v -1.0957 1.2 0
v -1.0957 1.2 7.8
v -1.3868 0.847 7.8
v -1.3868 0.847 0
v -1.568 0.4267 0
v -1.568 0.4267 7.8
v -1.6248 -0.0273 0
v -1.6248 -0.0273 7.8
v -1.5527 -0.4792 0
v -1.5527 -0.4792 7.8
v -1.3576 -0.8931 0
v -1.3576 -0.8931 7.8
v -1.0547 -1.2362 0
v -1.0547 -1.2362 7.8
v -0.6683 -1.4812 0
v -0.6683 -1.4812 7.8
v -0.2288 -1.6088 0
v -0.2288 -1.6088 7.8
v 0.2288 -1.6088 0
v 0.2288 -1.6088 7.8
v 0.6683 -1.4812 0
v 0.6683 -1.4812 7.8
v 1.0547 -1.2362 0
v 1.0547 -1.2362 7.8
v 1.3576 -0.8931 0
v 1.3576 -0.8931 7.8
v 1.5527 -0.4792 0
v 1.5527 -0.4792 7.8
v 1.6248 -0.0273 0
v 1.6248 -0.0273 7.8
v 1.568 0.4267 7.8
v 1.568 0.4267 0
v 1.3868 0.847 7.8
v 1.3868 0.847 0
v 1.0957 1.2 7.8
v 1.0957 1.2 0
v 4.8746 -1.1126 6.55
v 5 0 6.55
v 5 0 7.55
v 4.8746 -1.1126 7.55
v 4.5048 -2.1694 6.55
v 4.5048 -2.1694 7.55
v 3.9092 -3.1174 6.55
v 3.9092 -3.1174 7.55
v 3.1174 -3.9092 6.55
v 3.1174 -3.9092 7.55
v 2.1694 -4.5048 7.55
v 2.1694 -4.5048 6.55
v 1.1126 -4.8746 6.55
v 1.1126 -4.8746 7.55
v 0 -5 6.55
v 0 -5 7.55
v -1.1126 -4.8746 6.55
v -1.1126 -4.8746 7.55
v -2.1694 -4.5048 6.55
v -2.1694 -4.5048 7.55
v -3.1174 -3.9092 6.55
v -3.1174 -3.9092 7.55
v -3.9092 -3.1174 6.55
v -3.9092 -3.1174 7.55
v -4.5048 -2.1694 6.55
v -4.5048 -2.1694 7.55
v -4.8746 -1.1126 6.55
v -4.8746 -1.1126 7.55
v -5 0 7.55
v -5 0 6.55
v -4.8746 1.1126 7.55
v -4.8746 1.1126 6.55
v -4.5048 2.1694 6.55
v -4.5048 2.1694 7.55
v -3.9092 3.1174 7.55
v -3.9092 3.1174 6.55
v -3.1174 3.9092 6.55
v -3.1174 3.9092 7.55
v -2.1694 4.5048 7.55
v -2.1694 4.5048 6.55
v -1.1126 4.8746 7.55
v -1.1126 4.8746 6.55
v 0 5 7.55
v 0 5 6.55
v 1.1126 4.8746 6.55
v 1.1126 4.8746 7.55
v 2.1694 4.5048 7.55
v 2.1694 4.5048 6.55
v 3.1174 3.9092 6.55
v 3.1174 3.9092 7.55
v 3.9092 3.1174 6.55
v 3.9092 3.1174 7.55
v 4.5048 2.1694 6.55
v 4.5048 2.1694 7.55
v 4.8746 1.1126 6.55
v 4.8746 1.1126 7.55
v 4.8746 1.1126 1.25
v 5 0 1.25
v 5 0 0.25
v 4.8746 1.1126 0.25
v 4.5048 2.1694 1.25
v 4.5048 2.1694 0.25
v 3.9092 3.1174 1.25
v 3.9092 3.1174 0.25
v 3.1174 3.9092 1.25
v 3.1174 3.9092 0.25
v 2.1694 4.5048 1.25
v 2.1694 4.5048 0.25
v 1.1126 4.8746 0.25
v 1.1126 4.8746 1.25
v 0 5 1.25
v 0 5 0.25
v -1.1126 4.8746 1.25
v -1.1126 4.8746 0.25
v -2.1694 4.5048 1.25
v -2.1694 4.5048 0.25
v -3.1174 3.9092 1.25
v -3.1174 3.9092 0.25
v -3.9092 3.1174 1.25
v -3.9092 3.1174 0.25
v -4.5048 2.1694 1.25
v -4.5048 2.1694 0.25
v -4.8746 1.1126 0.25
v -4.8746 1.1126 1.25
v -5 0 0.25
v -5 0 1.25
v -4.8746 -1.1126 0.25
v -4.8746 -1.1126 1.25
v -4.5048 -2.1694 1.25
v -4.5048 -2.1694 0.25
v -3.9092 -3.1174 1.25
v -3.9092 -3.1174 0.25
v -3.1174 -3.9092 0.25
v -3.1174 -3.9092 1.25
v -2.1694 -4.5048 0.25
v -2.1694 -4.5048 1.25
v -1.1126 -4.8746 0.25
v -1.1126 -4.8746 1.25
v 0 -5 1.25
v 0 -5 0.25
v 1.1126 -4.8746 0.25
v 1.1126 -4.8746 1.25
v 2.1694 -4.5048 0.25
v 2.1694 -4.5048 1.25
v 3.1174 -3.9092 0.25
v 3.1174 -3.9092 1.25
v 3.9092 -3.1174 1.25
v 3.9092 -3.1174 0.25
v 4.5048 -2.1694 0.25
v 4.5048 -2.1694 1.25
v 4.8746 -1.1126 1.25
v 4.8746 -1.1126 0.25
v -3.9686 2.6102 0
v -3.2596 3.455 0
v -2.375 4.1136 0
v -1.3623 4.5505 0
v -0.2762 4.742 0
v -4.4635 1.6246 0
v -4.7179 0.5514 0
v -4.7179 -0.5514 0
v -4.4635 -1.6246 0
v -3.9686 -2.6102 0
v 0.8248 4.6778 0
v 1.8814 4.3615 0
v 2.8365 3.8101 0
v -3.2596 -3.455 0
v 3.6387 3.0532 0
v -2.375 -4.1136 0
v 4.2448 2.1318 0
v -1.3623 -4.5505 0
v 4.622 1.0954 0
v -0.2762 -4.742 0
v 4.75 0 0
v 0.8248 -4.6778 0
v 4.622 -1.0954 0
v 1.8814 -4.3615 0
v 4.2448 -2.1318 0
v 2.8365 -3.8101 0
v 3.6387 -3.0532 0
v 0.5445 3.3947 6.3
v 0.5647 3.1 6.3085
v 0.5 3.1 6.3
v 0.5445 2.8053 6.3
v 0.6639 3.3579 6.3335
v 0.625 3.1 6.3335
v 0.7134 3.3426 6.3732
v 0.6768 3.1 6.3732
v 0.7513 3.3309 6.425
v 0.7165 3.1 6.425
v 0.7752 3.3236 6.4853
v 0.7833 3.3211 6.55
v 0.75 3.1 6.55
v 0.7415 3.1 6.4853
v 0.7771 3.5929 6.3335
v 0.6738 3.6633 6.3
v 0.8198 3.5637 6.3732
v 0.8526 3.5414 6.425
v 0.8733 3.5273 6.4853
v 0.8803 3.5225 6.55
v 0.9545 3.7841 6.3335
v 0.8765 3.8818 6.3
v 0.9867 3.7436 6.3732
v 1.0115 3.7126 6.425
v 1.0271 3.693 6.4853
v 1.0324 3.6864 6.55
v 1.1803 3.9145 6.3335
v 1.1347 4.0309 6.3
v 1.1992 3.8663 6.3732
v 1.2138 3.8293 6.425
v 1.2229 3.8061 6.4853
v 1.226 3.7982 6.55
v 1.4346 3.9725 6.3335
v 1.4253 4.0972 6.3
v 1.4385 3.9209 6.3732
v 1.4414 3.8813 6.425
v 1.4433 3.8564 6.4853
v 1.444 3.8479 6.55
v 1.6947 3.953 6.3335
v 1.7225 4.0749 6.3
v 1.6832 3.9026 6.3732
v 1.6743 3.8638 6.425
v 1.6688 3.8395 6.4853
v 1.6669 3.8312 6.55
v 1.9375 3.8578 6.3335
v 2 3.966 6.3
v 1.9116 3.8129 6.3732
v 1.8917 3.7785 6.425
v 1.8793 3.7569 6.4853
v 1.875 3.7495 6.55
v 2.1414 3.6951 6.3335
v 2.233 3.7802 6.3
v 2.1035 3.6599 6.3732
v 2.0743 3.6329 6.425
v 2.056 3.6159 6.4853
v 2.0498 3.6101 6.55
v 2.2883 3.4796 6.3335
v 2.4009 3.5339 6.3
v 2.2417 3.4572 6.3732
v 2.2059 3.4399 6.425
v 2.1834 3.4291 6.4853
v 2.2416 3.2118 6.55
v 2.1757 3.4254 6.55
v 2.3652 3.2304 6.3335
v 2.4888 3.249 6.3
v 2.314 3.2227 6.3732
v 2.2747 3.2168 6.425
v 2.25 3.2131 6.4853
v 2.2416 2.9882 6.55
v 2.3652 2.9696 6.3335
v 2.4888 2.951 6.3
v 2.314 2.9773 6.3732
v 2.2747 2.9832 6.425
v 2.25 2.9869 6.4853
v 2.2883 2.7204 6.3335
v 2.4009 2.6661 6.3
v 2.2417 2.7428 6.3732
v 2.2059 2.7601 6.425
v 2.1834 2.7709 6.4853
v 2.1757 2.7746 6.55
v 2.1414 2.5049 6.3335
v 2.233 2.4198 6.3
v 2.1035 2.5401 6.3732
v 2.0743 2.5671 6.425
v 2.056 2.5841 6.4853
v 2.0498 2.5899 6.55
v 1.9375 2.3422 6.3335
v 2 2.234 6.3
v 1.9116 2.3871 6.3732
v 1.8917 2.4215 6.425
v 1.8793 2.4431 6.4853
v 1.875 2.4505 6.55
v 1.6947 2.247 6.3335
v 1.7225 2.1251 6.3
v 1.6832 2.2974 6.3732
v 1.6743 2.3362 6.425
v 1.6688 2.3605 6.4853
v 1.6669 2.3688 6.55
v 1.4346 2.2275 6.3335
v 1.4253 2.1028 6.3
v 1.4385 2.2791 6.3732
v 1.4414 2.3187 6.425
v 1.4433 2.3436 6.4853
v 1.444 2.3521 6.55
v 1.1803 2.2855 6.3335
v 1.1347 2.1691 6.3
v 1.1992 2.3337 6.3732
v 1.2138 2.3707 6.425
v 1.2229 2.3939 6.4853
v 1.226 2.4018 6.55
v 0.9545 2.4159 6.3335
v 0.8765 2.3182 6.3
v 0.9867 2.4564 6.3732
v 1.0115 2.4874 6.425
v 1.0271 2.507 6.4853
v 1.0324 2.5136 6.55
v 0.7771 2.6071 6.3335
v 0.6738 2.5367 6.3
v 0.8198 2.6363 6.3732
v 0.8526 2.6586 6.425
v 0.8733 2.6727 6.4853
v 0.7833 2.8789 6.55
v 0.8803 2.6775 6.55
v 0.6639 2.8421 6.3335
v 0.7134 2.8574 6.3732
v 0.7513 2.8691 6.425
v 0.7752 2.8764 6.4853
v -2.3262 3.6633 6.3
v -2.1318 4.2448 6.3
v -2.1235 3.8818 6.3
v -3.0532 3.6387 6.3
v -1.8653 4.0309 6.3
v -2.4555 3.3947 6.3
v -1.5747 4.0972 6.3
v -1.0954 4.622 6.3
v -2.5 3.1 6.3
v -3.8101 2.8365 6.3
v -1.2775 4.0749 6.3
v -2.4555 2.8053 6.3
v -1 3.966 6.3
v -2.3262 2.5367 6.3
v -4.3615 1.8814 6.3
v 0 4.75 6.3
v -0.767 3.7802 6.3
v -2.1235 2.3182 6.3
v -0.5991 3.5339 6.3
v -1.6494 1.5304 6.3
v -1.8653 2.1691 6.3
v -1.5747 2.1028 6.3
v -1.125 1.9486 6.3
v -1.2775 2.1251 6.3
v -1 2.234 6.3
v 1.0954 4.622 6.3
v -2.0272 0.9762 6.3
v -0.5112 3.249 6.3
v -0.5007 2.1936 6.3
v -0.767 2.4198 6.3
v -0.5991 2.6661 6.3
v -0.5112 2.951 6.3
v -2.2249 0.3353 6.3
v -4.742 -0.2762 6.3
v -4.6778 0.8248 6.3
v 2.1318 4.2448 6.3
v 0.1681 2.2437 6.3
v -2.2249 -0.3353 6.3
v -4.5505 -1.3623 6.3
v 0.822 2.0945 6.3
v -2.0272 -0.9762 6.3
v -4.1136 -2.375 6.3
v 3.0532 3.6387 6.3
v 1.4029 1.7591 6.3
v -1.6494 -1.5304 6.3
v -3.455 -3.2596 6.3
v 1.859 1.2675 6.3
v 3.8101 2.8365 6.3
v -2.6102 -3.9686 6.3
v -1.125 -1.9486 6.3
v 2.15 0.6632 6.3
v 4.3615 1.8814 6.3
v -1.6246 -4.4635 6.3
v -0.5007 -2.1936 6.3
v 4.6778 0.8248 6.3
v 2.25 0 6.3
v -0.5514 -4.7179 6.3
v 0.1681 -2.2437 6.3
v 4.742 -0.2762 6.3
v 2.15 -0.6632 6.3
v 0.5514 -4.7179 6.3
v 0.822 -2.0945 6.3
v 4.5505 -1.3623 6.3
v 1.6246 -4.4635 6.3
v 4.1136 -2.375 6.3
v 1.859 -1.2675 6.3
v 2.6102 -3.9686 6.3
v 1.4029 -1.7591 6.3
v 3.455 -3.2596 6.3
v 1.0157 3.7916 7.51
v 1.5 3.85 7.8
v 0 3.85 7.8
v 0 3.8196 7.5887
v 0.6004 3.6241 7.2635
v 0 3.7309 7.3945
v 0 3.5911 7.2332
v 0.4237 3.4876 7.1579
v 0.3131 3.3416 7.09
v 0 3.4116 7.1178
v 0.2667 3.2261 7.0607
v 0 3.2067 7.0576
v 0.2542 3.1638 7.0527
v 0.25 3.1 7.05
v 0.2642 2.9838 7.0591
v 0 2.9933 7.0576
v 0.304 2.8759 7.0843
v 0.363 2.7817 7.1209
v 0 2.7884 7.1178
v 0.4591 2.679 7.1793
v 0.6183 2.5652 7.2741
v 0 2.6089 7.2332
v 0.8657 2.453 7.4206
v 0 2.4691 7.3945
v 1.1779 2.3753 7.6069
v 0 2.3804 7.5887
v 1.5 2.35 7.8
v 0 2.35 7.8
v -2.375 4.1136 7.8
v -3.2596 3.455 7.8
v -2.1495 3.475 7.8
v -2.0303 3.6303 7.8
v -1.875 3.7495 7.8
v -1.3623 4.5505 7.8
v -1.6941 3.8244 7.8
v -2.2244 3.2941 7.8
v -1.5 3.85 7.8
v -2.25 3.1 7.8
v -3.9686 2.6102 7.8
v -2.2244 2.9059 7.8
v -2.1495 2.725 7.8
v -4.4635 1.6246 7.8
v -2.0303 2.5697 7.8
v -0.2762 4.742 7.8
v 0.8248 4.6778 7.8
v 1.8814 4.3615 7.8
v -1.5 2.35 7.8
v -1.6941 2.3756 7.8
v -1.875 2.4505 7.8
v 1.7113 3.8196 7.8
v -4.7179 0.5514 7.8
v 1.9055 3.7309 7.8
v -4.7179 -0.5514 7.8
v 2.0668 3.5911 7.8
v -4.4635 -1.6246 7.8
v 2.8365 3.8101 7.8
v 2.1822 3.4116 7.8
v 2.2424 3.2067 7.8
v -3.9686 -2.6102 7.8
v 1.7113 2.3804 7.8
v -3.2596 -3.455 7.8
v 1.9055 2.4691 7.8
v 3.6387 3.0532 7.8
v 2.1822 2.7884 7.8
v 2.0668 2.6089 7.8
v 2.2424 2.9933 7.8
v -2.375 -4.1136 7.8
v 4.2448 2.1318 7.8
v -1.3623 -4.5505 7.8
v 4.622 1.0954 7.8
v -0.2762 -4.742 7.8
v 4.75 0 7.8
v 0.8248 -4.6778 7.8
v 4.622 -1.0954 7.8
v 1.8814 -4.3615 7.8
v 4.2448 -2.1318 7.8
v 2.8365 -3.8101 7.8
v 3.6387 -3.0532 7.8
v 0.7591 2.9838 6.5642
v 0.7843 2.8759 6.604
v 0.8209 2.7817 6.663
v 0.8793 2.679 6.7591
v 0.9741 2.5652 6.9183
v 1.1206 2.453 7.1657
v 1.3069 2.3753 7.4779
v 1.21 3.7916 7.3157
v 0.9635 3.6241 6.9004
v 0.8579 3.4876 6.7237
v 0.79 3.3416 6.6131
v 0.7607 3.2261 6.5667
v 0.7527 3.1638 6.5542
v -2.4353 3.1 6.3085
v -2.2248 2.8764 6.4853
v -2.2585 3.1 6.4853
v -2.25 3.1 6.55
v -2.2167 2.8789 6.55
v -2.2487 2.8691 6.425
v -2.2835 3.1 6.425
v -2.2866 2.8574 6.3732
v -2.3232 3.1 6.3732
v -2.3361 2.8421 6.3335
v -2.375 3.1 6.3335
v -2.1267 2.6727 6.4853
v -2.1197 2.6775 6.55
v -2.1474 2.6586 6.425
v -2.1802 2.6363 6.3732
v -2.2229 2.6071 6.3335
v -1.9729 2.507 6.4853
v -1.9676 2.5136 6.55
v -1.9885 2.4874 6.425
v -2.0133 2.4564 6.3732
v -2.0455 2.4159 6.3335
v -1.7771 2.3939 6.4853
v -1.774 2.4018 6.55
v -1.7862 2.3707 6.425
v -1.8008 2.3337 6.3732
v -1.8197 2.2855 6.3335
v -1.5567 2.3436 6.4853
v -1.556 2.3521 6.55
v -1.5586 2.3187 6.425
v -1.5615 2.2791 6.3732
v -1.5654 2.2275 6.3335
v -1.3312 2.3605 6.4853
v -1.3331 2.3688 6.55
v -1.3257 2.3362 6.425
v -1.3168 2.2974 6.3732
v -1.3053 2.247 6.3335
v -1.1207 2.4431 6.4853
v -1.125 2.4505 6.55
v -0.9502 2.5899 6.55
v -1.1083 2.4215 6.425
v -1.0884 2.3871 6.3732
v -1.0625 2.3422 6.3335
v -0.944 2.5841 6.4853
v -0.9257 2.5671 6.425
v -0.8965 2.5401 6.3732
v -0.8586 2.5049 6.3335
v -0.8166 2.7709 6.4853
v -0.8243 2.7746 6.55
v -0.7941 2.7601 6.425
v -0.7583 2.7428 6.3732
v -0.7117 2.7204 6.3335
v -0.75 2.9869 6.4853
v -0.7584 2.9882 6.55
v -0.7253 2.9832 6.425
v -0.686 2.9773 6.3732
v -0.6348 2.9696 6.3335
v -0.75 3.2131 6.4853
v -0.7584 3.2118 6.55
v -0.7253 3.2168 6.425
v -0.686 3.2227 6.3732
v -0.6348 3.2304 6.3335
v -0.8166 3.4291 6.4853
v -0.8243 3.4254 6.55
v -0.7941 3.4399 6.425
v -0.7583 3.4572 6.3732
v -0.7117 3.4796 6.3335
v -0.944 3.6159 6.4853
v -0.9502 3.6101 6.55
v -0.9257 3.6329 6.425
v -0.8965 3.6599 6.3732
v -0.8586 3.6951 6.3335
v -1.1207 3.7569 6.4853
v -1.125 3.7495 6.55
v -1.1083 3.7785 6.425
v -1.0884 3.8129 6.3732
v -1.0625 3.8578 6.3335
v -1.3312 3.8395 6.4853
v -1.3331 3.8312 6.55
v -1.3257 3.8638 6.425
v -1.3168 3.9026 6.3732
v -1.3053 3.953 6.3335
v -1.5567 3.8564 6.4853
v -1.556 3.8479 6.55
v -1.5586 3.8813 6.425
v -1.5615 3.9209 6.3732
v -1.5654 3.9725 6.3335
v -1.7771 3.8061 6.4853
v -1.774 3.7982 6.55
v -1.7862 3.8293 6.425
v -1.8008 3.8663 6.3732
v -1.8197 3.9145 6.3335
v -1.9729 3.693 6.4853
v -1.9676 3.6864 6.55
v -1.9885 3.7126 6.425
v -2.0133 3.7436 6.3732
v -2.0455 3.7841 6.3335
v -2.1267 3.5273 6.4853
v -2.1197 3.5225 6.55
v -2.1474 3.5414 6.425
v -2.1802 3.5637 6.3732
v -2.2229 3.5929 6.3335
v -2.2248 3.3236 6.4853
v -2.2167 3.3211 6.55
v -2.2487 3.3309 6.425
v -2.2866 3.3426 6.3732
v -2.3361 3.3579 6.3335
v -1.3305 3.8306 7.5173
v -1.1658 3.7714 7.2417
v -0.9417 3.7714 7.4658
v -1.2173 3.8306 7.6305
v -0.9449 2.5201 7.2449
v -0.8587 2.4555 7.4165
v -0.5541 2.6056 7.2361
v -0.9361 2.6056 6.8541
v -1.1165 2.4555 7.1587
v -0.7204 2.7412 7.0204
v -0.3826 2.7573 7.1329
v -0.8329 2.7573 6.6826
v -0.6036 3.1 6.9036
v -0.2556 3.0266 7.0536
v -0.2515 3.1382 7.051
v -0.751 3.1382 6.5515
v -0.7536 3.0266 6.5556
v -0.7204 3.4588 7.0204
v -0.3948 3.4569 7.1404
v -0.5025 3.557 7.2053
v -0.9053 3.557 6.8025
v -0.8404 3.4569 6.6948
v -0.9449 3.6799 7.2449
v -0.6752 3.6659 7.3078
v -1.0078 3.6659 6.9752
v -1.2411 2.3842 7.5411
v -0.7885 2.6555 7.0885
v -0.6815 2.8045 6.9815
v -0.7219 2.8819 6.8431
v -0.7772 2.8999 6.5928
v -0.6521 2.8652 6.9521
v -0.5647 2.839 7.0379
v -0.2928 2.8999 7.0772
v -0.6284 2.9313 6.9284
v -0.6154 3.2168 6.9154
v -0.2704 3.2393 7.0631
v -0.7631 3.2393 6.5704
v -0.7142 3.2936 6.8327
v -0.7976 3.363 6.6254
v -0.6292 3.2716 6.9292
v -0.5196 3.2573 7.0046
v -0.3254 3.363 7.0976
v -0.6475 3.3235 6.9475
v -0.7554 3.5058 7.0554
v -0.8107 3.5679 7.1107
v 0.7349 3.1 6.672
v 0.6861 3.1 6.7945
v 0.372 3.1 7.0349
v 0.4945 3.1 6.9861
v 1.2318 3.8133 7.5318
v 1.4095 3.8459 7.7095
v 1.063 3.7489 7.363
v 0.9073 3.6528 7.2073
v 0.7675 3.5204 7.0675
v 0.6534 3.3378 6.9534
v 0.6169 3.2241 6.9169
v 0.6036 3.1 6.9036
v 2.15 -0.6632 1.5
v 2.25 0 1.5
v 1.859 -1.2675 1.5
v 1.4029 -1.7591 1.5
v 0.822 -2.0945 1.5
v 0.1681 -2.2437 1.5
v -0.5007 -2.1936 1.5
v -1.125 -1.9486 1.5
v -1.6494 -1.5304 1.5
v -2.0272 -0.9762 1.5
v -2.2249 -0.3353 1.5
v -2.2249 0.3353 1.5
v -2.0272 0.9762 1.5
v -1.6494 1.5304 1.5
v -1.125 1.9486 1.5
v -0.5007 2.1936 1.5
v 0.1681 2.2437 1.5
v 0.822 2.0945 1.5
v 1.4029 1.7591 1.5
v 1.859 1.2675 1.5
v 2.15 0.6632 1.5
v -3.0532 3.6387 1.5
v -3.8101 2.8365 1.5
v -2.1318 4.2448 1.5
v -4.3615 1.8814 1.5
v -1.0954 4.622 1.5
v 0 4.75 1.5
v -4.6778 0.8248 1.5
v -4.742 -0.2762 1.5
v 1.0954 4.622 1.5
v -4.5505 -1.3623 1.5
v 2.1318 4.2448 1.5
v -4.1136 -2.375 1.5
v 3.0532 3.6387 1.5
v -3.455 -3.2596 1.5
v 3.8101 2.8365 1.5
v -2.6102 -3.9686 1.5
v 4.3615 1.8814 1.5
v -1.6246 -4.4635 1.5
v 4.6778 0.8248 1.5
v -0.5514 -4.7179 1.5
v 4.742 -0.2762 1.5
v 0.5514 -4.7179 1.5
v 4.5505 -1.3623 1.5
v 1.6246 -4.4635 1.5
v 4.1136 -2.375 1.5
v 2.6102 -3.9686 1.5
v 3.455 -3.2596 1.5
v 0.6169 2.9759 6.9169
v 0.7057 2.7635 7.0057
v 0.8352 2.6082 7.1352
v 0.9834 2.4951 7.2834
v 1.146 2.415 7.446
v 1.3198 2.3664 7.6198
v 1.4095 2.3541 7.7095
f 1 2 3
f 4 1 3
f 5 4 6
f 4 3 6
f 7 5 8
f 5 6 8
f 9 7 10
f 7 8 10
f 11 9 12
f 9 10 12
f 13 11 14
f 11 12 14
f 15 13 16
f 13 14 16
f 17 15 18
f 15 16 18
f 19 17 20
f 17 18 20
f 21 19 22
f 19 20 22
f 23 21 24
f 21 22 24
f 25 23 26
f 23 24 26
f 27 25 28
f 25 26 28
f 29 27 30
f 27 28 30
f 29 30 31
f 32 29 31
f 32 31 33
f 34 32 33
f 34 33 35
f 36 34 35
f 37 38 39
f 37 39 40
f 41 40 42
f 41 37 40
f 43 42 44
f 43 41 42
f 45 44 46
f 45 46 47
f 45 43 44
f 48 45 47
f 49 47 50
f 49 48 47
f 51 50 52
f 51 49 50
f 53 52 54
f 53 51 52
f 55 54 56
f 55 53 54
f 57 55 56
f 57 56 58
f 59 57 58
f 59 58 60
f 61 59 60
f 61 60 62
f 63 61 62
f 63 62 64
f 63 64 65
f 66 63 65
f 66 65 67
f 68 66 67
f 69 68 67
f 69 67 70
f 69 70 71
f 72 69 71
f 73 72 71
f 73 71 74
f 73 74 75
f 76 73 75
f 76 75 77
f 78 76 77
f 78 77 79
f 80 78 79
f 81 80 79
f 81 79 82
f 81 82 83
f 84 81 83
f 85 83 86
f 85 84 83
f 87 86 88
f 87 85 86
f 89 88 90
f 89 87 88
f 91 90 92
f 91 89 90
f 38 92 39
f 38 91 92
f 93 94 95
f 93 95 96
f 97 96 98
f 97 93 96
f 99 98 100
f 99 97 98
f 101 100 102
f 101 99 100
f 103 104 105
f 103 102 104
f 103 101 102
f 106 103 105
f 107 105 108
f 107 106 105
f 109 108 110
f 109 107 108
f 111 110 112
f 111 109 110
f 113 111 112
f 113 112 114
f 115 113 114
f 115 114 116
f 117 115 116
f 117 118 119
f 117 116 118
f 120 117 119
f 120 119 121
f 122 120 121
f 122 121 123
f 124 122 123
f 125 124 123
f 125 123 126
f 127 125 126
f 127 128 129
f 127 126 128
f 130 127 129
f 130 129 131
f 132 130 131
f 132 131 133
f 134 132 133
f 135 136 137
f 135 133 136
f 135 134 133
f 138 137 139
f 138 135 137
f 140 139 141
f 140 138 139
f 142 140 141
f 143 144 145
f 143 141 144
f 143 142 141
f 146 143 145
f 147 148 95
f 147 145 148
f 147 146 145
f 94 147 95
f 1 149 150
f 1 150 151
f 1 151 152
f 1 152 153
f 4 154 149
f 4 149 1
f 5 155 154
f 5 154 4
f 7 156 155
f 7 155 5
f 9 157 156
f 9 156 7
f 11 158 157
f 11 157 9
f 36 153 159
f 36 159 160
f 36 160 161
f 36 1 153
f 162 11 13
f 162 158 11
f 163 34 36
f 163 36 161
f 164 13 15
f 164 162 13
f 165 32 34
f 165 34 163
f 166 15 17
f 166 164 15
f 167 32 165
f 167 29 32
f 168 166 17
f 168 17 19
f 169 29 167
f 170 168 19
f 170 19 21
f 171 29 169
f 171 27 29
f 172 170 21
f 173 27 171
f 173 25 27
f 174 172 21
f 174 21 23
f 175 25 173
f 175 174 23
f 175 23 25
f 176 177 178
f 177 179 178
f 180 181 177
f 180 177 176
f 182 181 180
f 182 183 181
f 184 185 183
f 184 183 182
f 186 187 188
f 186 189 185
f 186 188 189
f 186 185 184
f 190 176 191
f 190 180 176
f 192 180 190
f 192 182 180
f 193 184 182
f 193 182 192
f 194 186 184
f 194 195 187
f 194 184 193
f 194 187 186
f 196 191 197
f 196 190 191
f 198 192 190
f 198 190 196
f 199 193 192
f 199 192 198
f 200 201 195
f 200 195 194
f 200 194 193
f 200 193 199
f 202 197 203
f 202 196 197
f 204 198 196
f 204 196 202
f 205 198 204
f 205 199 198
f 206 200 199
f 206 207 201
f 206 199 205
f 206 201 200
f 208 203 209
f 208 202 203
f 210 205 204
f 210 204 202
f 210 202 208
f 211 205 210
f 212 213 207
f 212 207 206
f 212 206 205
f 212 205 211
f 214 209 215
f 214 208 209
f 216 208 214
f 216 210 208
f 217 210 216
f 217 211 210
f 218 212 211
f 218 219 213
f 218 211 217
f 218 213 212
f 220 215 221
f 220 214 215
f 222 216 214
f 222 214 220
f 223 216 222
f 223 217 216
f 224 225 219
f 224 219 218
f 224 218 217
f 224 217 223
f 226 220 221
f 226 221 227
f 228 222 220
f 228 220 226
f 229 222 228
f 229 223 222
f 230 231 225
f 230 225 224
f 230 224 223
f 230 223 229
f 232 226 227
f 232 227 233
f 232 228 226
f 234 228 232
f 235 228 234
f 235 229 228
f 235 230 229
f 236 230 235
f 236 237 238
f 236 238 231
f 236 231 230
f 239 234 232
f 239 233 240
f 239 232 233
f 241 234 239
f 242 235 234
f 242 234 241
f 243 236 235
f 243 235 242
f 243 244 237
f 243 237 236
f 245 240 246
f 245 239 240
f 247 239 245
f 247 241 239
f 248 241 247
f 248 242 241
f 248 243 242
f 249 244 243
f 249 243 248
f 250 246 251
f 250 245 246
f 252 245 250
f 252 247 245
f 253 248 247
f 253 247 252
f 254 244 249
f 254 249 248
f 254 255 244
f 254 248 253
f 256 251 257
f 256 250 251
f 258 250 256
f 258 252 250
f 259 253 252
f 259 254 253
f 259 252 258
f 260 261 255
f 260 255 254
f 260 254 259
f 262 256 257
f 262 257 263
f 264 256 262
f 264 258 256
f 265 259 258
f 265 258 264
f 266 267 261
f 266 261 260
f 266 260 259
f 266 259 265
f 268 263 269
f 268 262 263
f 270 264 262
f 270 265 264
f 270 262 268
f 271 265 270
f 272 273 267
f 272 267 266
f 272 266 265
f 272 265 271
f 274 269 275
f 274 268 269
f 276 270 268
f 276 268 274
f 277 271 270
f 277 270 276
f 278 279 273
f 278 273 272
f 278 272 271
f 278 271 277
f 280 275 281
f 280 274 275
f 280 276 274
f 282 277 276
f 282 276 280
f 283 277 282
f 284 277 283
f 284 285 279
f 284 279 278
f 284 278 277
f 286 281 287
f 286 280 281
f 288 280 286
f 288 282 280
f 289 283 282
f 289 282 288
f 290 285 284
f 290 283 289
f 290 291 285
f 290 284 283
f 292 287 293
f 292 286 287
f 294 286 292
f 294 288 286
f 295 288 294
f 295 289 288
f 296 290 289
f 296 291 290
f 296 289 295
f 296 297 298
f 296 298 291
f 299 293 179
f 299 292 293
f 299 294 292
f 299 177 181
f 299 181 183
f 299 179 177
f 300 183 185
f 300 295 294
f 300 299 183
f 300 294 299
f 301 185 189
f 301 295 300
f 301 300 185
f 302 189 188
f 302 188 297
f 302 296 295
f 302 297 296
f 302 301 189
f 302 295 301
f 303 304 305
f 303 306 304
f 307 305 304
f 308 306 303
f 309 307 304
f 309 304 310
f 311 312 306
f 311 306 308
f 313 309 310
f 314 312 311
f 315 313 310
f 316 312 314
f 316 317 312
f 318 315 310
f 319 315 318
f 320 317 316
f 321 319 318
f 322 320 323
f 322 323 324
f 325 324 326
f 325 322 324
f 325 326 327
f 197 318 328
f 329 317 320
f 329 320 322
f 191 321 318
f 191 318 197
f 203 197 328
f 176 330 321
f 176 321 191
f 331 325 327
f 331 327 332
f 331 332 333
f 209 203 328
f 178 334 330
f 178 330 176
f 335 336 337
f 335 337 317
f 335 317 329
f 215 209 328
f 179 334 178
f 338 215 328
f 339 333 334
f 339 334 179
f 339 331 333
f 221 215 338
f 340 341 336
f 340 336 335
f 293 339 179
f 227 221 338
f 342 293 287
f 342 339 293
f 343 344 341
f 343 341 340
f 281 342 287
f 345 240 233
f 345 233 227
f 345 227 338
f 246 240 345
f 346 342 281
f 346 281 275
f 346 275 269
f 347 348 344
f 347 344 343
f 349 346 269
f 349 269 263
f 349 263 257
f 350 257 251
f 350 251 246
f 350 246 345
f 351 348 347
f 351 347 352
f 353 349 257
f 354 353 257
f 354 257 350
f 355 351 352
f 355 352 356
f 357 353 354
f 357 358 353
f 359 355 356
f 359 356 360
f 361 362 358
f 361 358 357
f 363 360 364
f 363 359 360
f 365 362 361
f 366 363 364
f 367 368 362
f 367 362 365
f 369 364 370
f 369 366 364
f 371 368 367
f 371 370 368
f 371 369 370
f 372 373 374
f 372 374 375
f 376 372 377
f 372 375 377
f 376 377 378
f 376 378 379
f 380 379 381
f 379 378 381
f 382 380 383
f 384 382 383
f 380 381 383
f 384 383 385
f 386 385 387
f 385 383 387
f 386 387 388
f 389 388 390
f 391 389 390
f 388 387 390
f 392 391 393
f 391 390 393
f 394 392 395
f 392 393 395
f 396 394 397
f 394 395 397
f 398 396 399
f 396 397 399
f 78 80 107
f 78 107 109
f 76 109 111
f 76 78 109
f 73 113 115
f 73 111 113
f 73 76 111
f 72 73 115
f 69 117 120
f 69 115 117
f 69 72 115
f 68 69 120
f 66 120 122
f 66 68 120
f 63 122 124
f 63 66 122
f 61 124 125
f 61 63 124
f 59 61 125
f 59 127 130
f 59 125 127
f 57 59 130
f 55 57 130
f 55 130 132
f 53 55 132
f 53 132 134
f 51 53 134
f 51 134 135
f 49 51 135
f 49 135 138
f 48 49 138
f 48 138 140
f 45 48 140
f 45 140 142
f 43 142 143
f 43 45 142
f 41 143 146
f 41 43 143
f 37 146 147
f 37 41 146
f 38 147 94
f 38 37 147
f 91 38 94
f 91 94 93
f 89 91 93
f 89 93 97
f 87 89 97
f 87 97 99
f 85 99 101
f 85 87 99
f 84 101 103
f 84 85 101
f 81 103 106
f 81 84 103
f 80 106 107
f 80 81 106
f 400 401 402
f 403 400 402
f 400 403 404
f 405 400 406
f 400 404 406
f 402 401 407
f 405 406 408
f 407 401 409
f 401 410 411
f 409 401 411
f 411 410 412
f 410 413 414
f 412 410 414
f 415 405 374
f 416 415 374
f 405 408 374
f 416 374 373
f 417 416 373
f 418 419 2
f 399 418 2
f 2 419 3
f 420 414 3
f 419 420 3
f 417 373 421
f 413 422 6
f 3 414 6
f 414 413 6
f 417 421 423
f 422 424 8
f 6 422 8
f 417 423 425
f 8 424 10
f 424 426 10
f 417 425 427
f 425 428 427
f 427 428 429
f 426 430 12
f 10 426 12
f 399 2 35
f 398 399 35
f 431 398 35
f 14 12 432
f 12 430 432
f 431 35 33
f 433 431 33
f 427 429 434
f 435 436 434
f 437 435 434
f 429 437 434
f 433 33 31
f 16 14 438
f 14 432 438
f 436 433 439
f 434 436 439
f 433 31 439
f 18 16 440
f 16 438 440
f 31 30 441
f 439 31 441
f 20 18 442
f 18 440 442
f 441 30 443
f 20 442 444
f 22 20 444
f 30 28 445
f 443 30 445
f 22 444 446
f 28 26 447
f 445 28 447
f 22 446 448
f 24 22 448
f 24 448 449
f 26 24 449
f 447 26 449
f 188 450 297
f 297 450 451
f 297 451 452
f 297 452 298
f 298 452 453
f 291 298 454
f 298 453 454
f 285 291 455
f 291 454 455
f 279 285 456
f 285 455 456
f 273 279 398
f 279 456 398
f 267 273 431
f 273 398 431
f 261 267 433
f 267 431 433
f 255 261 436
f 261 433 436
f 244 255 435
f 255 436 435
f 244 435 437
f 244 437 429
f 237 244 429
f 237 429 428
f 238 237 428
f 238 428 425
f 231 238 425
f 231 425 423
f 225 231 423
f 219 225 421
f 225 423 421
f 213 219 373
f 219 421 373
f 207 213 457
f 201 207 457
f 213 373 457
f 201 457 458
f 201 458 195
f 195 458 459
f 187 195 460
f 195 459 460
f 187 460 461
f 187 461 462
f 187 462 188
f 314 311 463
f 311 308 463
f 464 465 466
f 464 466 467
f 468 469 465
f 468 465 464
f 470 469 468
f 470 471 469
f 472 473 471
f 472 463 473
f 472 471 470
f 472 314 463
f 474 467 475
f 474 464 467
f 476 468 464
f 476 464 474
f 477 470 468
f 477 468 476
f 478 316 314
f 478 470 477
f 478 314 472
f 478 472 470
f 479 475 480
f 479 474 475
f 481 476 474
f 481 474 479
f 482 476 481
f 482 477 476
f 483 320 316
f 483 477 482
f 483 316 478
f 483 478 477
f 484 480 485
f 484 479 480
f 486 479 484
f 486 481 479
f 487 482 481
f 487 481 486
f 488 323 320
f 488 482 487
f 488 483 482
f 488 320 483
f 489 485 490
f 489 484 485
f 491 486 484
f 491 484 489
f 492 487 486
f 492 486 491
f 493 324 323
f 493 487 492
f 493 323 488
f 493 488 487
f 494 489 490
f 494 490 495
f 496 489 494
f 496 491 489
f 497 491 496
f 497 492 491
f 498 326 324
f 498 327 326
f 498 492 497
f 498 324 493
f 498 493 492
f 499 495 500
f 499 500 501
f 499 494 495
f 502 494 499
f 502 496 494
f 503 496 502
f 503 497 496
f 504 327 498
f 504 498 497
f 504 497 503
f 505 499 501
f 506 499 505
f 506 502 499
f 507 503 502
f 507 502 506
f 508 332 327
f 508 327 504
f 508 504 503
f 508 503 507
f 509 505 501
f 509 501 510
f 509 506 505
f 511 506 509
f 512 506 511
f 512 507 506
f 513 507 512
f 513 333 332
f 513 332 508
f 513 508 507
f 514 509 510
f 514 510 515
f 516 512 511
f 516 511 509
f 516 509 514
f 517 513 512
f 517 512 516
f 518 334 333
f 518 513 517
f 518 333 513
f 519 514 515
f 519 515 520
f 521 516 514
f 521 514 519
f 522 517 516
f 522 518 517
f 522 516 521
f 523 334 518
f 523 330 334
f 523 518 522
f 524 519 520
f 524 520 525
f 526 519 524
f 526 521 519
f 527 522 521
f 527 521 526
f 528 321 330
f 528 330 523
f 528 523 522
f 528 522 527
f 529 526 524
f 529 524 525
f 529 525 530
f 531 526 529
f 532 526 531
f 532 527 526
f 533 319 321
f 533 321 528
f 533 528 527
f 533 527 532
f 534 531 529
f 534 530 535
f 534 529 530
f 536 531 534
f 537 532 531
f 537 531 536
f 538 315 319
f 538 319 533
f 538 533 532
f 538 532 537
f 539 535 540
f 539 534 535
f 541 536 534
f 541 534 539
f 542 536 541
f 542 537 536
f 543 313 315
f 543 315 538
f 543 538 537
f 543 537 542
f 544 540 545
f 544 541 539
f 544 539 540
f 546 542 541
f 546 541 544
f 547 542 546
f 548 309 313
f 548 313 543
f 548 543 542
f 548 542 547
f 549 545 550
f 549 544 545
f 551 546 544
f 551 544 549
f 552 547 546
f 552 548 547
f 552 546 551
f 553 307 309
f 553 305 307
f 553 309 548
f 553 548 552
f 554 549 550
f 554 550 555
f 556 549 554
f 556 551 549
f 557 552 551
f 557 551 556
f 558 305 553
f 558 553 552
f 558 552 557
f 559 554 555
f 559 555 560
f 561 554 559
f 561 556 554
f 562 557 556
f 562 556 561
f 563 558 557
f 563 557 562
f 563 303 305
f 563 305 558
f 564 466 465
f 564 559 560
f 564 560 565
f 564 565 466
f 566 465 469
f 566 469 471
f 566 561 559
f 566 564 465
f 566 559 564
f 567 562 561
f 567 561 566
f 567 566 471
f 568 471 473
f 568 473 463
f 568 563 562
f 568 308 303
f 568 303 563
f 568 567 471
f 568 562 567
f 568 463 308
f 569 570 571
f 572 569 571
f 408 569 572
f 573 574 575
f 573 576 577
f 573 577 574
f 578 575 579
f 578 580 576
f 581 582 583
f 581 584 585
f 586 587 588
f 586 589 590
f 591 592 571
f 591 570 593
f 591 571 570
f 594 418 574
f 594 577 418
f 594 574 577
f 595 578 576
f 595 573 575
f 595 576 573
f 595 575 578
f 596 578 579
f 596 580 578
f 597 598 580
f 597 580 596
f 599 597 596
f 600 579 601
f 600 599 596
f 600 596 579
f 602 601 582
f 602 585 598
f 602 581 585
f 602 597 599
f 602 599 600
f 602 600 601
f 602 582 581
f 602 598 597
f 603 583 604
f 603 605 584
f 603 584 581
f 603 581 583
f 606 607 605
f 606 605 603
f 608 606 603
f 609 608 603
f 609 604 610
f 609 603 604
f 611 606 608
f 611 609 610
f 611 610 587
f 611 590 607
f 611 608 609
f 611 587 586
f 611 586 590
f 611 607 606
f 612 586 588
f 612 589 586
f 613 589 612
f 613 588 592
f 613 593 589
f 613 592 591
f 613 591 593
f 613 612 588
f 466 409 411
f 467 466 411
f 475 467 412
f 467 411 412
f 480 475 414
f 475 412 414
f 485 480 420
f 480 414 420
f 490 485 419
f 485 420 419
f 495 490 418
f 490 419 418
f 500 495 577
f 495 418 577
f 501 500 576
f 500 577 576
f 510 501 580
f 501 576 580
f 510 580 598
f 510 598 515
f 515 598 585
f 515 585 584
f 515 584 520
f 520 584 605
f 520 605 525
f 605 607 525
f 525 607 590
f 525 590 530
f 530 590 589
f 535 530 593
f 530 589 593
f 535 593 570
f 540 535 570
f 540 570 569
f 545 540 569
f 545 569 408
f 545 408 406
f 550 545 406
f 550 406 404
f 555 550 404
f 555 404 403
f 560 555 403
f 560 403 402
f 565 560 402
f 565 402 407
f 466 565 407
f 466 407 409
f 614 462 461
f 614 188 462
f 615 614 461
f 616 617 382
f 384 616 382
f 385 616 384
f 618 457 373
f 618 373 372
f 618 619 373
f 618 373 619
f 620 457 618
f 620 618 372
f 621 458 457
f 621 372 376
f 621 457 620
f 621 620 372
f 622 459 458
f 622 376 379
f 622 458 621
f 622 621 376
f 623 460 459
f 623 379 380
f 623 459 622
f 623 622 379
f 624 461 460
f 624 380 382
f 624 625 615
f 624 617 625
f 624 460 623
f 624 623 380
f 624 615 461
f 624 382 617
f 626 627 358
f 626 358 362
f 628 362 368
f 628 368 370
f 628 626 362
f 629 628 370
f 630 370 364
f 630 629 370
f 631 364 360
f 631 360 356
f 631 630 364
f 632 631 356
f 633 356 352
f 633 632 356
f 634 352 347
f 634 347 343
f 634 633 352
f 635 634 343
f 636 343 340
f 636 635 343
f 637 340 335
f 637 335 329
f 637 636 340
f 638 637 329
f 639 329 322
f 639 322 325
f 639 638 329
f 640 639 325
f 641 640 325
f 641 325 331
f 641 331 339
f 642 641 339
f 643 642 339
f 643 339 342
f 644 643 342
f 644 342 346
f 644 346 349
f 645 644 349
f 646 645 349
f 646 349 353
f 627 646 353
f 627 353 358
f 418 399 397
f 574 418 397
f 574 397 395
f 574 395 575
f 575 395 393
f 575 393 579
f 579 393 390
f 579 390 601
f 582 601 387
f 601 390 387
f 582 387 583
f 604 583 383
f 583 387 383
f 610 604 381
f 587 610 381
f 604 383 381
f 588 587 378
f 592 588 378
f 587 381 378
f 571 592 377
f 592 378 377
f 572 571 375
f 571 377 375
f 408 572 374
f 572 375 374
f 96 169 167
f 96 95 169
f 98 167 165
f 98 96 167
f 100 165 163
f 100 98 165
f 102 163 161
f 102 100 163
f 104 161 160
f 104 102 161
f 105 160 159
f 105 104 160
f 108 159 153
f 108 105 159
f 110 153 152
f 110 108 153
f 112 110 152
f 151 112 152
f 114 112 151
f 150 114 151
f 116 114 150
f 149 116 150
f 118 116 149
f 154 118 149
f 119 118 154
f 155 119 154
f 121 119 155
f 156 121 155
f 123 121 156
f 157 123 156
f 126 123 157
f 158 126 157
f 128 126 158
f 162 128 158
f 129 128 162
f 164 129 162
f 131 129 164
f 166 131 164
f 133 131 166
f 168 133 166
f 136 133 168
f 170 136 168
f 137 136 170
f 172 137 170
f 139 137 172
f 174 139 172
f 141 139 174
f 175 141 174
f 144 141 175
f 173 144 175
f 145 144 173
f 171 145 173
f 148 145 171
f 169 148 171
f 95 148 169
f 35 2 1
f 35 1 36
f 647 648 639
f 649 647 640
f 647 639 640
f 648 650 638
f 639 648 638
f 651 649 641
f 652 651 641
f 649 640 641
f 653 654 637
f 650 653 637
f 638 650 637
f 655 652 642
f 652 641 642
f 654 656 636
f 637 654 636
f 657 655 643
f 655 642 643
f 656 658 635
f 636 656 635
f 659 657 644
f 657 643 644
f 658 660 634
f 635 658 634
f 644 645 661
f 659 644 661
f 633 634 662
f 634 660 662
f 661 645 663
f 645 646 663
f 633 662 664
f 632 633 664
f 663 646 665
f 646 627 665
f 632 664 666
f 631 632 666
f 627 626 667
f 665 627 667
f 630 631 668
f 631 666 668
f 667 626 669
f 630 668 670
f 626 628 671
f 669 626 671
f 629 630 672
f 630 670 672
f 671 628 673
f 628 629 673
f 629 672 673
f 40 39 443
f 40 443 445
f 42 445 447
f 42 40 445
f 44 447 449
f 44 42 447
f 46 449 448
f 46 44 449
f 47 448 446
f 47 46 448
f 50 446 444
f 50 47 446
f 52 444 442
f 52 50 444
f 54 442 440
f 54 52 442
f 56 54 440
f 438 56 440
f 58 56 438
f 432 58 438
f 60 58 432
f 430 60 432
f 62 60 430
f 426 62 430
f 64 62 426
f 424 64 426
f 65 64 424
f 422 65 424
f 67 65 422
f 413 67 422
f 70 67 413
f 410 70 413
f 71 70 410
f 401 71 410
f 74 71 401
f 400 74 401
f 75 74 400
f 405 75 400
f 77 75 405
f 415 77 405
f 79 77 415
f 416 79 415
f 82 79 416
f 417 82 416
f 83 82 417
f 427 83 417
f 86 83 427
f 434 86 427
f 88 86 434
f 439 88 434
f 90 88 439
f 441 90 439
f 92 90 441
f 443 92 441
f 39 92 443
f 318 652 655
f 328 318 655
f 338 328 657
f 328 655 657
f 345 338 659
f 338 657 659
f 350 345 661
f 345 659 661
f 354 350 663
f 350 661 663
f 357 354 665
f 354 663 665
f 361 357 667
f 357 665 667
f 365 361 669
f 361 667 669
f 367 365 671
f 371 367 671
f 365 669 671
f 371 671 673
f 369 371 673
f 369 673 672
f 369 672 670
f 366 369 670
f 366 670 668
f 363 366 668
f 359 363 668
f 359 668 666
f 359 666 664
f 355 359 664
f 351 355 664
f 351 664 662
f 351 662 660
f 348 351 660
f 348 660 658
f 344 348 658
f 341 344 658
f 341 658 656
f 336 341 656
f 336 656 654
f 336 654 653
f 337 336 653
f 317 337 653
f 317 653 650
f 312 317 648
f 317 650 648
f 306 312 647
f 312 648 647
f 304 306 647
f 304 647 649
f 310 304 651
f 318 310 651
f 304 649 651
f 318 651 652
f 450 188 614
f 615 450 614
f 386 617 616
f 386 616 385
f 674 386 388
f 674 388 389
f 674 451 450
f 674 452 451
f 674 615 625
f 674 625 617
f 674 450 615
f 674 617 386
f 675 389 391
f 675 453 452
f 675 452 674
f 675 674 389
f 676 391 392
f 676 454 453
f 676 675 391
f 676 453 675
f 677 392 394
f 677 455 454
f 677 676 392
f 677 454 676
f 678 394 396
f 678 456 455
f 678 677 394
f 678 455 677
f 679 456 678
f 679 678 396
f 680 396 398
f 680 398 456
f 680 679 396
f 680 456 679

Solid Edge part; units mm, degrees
sketch "Sketch1" plane through (0, 0, 0) normal (0, -1, 0) x (1, 0, 0)
  line L0 (5, 6.3) -> (2.25, 6.3)
  line L1 (2.25, 6.3) -> (2.25, 1.5)
  line L2 (5, 1.5) -> (2.25, 1.5)
  line L3 (5, 0) -> (5, 1.5)
  line L4 (0, 0) -> (5, 0)
  line L5 (0, 7.8) -> (0, 0)
  line L6 (5, 7.8) -> (0, 7.8)
  line L7 (5, 7.8) -> (5, 6.3)
revolve "RevolvedProtrusion1" add sketch "Sketch1" angle 360 about axis through (0, 0, 7.8) along (0, 0, -1)
sketch "Sketch2" plane through (0, 0, 7.8) normal (0, 0, 1) x (1, 0, 0)
  line L0 (-1.0957, 1.2) -> (1.0957, 1.2)
  arc A0 (1.0957, 1.2) -> (-1.0957, 1.2) centre (0, 0) cw
extrude "Cutout1" cut sketch "Sketch2" against normal through all
sketch "Sketch3" plane through (0, 0, 7.8) normal (0, 0, 1) x (-1, 0, 0)
  circle A0 centre (-1.5, -3.1) radius 0.75
  circle A1 centre (1.5, -3.1) radius 0.75
  dimension "D1" = 1.5
  dimension "D2" = 1.5
  dimension "D3" = 3
  dimension "D4" = 1.9
extrude "Cutout2" cut sketch "Sketch3" against normal up to surface (1.5 mm away)
chamfer "Chaflán_1" distance 0.25 angle 45 4 edges at (-5, 0, 0) (-5, 0, 1.5) (-5, 0, 6.3) (-5, 0, 7.8)
sketch "Sketch4" plane through (0, 0, 0) normal (1, 0, 0) x (0, 1, 0)
  circle A0 centre (3.1, 7.8) radius 0.75
extrude "VaciadoExtruido_3" cut sketch "Sketch4" along normal mid plane 3
fillet "Redondeo_2" radius 0.5 2 edges at (-0.75, 3.1, 7.05) (0.75, 3.1, 7.05)
fillet "Redondeo_3" radius 0.25 2 edges at (2.25, 3.1, 6.3) (-0.75, 3.1, 6.3)
sketch "Sketch5" plane through (0, 0, 1.5) normal (0, 0, 1) x (0, 1, 0)
  circle A0 centre (0, 0) radius 5
  circle A1 centre (0, 0) radius 4.75
extrude "ProtrusiónExtruida_1" add sketch "Sketch5" against normal blind 0.25 and the other way up to vertex (5.05 mm away)
